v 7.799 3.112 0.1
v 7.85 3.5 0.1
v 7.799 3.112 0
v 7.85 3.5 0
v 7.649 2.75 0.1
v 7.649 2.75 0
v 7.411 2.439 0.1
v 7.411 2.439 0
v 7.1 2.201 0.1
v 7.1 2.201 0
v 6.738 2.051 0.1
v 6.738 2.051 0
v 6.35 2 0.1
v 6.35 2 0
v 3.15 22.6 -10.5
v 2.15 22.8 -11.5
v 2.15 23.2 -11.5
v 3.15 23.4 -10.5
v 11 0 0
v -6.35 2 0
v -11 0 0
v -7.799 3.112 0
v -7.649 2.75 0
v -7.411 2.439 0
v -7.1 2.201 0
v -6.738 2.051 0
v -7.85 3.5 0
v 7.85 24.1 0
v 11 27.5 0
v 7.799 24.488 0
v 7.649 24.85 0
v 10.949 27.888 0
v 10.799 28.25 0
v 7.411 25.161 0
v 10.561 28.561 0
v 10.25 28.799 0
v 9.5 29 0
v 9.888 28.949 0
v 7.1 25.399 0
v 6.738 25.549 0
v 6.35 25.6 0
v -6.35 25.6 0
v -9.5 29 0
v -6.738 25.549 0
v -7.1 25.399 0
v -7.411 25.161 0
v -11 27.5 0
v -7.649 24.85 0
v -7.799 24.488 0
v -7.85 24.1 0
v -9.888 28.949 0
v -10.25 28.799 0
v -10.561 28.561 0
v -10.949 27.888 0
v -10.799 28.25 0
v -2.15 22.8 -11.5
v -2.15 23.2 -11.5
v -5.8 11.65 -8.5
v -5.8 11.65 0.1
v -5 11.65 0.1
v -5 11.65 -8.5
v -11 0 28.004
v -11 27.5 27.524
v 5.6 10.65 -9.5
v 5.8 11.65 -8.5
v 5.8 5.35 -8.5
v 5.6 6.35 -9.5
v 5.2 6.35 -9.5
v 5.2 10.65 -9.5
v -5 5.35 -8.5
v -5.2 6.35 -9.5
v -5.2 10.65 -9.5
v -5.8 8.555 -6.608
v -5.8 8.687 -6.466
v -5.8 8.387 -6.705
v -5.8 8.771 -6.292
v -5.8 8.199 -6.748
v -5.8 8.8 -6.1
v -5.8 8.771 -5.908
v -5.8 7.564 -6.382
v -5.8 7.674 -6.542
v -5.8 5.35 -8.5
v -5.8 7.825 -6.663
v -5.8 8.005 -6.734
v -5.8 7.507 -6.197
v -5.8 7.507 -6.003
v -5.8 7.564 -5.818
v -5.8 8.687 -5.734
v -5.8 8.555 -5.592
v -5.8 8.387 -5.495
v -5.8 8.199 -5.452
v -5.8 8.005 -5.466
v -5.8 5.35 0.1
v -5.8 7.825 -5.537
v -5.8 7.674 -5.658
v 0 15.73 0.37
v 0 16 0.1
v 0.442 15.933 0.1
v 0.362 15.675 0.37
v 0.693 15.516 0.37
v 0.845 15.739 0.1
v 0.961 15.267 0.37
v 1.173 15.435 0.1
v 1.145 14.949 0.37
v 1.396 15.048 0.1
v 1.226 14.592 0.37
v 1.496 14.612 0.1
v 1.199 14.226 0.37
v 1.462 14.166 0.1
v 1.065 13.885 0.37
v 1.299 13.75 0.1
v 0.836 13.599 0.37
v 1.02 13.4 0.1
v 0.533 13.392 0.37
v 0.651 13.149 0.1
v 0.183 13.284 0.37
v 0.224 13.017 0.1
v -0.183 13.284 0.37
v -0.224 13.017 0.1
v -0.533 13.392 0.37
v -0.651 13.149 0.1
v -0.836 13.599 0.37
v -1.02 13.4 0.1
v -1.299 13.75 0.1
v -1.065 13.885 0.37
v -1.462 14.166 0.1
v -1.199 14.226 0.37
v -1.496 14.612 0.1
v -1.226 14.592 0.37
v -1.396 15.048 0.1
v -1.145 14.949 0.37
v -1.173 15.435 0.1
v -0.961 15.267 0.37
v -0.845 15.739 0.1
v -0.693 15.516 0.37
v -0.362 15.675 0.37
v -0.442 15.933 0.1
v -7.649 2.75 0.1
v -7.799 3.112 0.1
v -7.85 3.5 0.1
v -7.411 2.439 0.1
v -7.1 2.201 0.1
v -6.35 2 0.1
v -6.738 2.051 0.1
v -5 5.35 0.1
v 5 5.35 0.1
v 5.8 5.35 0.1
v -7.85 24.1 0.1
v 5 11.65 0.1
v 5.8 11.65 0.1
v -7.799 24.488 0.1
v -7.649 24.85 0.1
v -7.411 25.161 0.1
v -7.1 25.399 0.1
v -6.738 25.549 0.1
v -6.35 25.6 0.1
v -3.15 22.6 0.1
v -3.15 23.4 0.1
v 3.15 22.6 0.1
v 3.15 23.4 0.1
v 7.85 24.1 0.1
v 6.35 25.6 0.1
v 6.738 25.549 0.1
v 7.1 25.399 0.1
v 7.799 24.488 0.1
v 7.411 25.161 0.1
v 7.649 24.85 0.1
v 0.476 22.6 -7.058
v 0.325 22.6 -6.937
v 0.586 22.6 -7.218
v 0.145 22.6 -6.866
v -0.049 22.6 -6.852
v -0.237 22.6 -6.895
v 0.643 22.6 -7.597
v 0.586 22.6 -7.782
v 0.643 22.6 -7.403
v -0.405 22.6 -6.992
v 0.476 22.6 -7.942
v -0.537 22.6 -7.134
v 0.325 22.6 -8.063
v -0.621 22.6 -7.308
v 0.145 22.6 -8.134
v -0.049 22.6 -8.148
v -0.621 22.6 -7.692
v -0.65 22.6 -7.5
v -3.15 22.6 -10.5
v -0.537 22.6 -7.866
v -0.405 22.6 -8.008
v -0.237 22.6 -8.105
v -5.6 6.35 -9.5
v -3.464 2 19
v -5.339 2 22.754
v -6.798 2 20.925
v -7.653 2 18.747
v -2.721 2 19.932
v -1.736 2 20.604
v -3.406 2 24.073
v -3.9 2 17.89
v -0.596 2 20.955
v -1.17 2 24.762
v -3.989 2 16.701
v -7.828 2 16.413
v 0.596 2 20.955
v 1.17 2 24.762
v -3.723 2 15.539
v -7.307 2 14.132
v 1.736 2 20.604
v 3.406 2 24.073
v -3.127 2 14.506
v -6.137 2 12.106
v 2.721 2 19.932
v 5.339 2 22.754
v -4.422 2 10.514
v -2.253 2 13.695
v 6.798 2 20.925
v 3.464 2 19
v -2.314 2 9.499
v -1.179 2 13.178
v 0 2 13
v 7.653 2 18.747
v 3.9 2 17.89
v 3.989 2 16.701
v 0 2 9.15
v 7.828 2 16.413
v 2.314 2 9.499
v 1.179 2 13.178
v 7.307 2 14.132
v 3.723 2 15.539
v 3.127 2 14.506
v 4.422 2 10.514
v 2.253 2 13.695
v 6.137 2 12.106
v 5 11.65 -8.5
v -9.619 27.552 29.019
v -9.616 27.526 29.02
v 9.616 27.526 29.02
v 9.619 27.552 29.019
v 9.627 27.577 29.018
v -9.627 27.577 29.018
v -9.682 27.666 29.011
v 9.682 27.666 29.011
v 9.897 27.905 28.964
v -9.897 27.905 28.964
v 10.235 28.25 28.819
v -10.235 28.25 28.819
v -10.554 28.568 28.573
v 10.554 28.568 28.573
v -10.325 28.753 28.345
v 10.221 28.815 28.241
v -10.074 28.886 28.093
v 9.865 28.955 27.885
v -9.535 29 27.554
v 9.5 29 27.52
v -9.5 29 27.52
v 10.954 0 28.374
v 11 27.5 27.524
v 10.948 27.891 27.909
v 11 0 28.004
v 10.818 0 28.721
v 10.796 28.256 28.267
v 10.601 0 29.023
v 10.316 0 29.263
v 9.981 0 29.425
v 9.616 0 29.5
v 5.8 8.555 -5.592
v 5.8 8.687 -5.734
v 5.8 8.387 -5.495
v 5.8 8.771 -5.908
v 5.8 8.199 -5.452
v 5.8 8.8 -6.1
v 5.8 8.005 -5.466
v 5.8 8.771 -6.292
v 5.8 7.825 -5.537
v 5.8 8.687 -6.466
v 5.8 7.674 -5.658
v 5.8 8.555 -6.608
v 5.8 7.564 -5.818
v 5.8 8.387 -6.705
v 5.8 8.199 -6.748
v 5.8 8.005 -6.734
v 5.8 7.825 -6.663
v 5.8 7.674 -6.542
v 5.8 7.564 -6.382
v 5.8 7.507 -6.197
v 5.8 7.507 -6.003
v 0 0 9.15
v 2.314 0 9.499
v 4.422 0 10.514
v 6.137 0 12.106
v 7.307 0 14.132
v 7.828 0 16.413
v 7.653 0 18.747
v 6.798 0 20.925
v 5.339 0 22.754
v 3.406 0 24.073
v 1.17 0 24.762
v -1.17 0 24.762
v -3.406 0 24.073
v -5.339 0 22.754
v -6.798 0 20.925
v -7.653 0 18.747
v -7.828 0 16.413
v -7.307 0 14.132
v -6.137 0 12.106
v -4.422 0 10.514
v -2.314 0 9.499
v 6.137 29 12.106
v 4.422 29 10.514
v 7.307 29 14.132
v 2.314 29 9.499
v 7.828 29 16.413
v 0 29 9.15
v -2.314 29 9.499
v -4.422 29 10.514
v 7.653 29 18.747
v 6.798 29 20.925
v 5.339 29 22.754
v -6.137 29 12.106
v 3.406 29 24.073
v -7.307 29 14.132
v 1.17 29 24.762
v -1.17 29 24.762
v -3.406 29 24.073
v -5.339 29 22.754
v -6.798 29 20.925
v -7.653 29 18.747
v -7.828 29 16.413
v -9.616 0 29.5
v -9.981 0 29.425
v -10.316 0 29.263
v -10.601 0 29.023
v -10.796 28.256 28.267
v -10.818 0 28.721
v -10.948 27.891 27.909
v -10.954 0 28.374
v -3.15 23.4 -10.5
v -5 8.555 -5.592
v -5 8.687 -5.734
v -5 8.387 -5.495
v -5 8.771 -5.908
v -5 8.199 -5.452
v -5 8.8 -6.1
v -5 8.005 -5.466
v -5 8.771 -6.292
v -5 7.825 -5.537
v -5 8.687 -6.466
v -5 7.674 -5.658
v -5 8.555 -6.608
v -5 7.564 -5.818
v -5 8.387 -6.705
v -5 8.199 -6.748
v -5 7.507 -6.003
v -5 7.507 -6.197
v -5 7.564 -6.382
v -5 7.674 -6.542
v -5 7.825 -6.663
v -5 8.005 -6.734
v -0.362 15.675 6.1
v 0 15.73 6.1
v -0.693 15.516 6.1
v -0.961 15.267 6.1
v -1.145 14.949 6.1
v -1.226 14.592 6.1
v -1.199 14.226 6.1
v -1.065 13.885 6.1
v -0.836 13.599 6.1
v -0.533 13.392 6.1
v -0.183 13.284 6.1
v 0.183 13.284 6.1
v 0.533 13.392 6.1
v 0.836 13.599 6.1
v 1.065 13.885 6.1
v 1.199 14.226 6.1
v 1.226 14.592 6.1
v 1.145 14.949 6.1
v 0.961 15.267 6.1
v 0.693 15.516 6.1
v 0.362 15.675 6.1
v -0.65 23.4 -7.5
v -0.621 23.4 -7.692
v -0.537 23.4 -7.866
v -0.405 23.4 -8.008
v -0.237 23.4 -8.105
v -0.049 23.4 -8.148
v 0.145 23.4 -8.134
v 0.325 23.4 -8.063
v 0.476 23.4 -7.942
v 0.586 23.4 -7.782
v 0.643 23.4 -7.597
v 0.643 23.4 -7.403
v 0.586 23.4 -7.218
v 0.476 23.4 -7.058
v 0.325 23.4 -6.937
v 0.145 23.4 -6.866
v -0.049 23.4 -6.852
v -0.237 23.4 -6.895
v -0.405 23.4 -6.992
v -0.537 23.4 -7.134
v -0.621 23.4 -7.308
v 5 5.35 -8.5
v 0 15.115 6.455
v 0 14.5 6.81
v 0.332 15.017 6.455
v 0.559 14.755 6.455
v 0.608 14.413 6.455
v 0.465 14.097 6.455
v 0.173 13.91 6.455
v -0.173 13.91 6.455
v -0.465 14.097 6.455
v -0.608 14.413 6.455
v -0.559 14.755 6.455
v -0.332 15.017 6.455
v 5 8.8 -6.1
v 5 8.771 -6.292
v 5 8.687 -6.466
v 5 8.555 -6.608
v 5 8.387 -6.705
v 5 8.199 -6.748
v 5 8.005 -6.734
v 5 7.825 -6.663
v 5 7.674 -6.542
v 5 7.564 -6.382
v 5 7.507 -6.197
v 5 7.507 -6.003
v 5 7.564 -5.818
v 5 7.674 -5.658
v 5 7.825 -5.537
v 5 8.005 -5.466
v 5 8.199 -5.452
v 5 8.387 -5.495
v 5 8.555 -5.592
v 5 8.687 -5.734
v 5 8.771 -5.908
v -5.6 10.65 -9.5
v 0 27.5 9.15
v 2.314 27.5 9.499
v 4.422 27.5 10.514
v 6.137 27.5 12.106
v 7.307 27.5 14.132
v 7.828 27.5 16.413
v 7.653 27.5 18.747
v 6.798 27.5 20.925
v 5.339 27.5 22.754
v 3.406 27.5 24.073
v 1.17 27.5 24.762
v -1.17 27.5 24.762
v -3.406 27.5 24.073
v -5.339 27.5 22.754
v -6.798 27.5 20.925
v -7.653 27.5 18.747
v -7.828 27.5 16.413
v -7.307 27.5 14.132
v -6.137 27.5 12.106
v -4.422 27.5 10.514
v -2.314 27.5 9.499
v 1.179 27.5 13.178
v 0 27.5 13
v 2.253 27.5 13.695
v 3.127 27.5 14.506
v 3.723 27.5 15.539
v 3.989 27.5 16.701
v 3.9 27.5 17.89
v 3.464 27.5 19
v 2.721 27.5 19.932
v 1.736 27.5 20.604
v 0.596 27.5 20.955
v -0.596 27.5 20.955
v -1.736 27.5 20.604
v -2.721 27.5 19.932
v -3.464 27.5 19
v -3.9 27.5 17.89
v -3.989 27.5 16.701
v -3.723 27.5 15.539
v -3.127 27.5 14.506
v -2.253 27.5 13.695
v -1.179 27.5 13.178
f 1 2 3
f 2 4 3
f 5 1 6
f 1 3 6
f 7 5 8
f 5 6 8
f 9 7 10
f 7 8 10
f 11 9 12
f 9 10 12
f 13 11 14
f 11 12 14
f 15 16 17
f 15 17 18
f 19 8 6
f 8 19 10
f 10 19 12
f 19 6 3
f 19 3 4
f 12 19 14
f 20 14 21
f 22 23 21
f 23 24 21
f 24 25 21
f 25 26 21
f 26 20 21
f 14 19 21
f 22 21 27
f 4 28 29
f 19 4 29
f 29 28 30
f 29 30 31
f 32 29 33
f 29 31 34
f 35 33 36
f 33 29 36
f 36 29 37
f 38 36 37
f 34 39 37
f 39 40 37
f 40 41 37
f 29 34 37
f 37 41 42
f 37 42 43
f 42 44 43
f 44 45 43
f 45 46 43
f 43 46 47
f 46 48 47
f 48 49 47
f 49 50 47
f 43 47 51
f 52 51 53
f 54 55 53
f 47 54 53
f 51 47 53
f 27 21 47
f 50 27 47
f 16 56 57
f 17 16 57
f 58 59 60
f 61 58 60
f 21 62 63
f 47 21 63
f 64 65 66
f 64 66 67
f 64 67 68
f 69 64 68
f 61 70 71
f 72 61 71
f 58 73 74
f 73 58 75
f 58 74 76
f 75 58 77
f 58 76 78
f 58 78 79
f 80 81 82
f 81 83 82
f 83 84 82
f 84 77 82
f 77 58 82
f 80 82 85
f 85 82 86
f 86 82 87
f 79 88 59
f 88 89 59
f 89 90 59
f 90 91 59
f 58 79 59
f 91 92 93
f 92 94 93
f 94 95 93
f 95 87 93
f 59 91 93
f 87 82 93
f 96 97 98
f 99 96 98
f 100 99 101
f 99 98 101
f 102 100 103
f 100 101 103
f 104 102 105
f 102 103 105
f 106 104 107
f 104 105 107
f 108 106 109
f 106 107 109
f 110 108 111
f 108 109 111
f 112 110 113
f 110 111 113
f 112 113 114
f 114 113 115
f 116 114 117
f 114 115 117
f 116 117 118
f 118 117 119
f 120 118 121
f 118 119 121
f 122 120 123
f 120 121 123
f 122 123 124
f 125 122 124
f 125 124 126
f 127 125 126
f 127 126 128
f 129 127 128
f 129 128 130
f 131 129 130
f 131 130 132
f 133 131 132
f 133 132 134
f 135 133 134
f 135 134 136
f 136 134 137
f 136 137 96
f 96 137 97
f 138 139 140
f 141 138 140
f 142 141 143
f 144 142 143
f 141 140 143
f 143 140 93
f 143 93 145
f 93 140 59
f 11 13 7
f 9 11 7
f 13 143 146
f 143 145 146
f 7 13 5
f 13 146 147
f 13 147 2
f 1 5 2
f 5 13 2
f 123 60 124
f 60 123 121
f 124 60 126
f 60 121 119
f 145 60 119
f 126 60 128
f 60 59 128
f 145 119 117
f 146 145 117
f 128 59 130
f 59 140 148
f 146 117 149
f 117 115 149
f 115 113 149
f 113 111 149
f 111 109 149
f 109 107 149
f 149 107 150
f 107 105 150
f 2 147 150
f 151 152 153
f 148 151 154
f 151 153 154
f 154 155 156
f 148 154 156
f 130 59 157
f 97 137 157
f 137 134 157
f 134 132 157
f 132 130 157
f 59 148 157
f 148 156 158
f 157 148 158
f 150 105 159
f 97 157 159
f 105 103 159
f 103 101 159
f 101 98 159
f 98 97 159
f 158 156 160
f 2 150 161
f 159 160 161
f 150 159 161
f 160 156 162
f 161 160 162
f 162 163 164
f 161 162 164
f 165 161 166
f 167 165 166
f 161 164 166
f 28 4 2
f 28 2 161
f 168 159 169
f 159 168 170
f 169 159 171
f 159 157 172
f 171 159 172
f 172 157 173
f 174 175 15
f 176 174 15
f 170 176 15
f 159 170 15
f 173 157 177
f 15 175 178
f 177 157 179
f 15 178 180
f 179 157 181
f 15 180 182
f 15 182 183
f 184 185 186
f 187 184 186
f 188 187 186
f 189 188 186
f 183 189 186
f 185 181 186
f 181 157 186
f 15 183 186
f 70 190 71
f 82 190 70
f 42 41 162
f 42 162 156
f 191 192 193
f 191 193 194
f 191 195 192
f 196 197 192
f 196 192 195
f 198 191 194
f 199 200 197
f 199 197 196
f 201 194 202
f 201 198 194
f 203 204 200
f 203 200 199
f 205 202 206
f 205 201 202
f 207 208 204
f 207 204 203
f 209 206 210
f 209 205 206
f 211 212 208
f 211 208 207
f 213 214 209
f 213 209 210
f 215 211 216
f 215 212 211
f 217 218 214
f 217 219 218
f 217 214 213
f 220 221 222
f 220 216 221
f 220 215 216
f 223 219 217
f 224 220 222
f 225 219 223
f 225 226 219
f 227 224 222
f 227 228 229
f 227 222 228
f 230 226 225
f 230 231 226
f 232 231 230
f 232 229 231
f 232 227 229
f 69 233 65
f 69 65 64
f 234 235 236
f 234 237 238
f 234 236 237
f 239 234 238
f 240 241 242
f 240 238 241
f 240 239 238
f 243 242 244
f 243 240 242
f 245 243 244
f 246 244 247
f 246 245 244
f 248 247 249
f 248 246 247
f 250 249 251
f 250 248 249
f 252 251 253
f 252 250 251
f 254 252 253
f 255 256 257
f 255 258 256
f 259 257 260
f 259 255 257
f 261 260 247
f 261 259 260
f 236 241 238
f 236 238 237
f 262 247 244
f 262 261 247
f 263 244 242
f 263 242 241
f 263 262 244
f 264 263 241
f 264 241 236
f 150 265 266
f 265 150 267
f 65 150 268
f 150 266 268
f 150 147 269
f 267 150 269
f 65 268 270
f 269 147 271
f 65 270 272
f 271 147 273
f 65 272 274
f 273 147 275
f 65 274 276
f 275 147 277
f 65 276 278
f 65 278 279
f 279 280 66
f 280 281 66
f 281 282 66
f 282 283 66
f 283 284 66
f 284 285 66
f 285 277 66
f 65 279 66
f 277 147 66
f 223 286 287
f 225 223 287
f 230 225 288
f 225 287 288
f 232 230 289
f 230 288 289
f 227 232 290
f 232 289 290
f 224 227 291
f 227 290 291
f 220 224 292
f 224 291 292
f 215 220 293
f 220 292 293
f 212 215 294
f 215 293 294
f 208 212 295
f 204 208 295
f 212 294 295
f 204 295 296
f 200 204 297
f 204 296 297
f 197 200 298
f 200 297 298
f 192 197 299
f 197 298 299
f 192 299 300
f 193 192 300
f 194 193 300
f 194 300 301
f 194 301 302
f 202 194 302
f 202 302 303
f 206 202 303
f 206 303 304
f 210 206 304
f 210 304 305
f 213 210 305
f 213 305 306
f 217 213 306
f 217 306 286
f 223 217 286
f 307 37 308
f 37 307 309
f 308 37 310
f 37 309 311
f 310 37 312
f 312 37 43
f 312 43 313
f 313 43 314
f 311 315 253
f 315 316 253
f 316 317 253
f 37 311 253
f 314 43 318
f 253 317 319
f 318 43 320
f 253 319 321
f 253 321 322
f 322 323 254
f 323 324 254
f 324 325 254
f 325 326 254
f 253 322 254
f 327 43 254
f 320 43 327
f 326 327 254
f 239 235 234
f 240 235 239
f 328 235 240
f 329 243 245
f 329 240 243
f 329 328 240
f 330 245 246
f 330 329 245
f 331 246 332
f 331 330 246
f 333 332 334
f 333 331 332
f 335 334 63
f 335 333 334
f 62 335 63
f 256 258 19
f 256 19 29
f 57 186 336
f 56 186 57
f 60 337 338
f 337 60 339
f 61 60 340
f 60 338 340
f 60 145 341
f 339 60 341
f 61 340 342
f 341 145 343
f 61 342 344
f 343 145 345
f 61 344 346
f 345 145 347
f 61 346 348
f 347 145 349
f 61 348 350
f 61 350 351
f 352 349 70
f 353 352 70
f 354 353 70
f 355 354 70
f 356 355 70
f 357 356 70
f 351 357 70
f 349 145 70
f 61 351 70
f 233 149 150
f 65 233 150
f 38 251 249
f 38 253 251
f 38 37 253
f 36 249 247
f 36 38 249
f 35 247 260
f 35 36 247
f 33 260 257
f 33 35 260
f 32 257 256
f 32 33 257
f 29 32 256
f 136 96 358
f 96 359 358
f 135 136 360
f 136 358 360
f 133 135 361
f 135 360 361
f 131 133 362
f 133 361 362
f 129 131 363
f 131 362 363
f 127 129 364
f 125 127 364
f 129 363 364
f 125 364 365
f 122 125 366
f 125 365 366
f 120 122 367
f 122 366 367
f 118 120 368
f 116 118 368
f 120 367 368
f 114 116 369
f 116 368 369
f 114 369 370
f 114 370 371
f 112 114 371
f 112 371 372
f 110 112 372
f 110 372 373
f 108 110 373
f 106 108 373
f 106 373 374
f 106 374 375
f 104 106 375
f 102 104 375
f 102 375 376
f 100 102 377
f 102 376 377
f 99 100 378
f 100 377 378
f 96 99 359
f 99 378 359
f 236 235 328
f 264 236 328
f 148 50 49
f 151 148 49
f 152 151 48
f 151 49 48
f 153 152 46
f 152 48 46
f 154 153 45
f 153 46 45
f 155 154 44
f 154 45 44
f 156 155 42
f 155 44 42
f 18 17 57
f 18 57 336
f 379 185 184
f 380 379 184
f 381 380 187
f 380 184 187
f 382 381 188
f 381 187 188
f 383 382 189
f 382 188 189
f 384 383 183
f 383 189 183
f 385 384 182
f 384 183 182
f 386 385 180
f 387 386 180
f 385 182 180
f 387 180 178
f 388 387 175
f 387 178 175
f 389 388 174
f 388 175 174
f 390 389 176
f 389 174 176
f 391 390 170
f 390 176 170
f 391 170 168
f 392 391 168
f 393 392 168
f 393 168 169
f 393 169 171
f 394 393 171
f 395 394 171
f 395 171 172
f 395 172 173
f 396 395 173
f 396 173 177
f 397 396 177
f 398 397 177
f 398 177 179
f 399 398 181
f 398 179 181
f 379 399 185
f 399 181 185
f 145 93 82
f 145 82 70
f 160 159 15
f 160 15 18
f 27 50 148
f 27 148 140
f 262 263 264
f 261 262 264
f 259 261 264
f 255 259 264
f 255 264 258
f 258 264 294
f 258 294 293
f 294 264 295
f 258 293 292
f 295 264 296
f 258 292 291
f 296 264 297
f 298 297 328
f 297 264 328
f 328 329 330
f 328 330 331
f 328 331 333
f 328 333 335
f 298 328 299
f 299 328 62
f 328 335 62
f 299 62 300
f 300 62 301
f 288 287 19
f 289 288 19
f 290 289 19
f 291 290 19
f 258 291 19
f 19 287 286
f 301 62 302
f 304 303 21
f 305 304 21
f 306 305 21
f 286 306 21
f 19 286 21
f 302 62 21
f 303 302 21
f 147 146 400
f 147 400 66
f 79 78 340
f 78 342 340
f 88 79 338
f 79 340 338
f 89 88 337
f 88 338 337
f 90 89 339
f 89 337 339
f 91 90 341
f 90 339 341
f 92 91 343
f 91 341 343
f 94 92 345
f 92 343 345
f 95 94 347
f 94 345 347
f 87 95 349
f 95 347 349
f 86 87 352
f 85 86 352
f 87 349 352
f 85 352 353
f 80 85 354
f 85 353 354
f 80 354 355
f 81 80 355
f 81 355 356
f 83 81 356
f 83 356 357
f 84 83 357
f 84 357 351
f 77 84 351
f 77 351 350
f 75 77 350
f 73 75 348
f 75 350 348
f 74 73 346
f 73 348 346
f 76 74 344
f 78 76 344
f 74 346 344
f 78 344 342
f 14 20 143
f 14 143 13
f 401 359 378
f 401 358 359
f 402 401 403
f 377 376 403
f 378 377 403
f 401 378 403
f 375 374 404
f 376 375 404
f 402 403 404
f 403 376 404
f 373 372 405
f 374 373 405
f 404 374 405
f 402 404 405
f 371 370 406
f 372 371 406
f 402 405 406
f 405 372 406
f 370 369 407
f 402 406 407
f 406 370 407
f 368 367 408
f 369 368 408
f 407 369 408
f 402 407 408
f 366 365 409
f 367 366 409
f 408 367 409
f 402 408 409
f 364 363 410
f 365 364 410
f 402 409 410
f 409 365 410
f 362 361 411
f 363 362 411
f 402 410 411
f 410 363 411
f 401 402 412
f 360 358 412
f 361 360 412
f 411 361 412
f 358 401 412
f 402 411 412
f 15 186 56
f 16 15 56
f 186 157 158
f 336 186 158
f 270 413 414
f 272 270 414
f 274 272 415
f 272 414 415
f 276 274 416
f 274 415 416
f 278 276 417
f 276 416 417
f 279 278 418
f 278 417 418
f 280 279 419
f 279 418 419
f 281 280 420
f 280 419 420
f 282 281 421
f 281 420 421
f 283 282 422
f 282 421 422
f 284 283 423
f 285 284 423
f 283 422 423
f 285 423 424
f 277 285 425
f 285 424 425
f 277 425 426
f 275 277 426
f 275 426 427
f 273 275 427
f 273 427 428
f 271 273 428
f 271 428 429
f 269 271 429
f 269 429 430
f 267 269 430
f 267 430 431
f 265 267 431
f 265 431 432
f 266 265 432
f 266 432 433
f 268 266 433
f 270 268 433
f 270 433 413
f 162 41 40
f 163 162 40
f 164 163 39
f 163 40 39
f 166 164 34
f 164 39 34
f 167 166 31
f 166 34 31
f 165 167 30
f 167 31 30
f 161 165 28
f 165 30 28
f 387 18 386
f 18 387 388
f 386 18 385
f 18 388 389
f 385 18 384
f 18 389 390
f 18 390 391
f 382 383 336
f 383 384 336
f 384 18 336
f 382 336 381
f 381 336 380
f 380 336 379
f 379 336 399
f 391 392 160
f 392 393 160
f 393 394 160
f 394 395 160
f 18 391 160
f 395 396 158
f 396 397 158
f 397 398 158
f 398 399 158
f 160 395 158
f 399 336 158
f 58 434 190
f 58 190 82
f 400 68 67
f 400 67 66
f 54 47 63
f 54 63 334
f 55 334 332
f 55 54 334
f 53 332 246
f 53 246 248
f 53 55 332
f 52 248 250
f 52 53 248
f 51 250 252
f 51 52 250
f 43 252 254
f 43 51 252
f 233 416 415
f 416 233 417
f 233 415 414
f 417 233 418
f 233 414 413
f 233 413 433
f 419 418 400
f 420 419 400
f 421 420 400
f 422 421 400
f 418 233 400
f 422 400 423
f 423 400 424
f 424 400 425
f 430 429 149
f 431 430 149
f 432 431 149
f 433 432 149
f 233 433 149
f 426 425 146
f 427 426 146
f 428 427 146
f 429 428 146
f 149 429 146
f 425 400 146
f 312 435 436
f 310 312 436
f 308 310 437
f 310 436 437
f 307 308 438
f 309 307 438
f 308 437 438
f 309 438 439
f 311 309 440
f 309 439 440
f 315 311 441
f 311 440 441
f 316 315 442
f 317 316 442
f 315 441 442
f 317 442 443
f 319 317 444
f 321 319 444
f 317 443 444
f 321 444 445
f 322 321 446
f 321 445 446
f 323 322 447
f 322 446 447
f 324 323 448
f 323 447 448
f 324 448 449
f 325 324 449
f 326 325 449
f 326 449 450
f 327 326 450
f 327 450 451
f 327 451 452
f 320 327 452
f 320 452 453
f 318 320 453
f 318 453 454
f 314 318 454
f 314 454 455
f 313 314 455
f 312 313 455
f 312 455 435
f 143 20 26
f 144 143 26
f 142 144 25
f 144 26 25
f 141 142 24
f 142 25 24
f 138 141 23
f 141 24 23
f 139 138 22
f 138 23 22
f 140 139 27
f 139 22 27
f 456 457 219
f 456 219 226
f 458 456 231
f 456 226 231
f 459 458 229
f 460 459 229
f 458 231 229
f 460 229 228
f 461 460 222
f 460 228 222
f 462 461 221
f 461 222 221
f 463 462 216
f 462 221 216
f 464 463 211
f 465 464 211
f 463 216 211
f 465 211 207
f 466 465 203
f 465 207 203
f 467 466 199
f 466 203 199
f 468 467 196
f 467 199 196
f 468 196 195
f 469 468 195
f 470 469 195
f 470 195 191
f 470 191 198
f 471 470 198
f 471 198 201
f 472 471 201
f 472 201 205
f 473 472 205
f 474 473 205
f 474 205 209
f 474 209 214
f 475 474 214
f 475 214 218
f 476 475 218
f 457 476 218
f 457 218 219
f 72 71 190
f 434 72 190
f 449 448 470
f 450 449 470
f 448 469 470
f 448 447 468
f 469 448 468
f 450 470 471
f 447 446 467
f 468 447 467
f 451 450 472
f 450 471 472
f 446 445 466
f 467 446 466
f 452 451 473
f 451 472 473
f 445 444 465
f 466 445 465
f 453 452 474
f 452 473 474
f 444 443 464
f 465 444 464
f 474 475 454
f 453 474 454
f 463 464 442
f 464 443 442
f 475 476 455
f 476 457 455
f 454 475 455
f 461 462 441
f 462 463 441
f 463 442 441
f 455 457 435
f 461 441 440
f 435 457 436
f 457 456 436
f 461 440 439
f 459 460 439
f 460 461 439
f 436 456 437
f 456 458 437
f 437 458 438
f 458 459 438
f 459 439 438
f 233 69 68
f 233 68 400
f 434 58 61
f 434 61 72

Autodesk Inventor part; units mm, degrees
sketch "Sketch_2" plane through (0, 0, 0) normal (1, 0, 0) x (0, 1, 0)
  line L0 (0, 29.5) -> (0, 0)
  line L1 (0, 0) -> (29, 0)
  line L2 (29, 0) -> (29, 27.5198)
  arc A0 (29, 27.5198) -> (27.5262, 29.0195) centre (27.5, 27.5198) ccw
  line L3 (27.5262, 29.0195) -> (0, 29.5)
extrude "Extrusion1" add sketch "Sketch_2" along normal mid plane 22
sketch "Sketch_3" plane through (0, 0, 0) normal (0, 0.9998, -0.0175) x (1, 0, 0)
  line L0 (-11, -28) -> (-11, -38)
  line L1 (-11, -38) -> (11, -38)
  line L2 (11, -38) -> (11, -28)
  arc A0 (9.5, -29.5) -> (11, -28) centre (9.5, -28) ccw
  line L3 (9.5, -29.5) -> (-9.5, -29.5)
  arc A1 (-11, -28) -> (-9.5, -29.5) centre (-9.5, -28) ccw
extrude "Extrusion2" cut sketch "Sketch_3" along normal mid plane 60
sketch "Sketch_4" plane through (0, 0, 0) normal (0, 0, 1) x (1, 0, 0)
  arc A0 (-9.5, 29) -> (-11, 27.5) centre (-9.5, 27.5) ccw
  line L0 (-9.5, 29) -> (9.5, 29)
  arc A1 (11, 27.5) -> (9.5, 29) centre (9.5, 27.5) ccw
  line L1 (11, 27.5) -> (11, 37.5)
  line L2 (11, 37.5) -> (-11, 37.5)
  line L3 (-11, 37.5) -> (-11, 27.5)
extrude "Extrusion3" cut sketch "Sketch_4" along normal blind 29.5
sketch "Sketch_5" plane through (0, 0, 0) normal (1, 0, 0) x (0, 1, 0)
  line L0 (0, 17) -> (29, 17)
  line L1 (29, 17) -> (29, 9.15)
  line L2 (29, 9.15) -> (27.5, 9.15)
  line L3 (27.5, 9.15) -> (27.5, 13)
  line L4 (27.5, 13) -> (2, 13)
  line L5 (2, 13) -> (2, 9.15)
  line L6 (2, 9.15) -> (0, 9.15)
  line L7 (0, 9.15) -> (0, 17)
  line L8 (0, 17) -> (29, 17)
revolve "Revolution1" cut sketch "Sketch_5" angle 360 about axis through (0, 0, 17) along (0, -1, 0)
sketch "Sketch_16" plane through (0, 0, 0) normal (0, 0, 1) x (1, 0, 0)
  arc A0 (-7.85, 3.5) -> (-6.35, 2) centre (-6.35, 3.5) ccw
  line L0 (-6.35, 2) -> (6.35, 2)
  arc A1 (6.35, 2) -> (7.85, 3.5) centre (6.35, 3.5) ccw
  line L1 (7.85, 3.5) -> (7.85, 24.1)
  arc A2 (7.85, 24.1) -> (6.35, 25.6) centre (6.35, 24.1) ccw
  line L2 (6.35, 25.6) -> (-6.35, 25.6)
  arc A3 (-6.35, 25.6) -> (-7.85, 24.1) centre (-6.35, 24.1) ccw
  line L3 (-7.85, 24.1) -> (-7.85, 3.5)
extrude "Extrusion4" cut sketch "Sketch_16" along normal blind 0.1
sketch "Sketch6" plane through (0, 0, 0.1) normal (0, 0, -1) x (-1, 0, 0)
  point P0 (0, 14.5)
hole "Hole1" at (0, 14.5, 0.1) direction (0, 0, 1) diameter 2.459 depth 6 tip angle 120 countersink diameter 3 countersink angle 90 thread size "M3x0.5" class "6H" standard "ISO Metric profile"
sketch "Sketch_18" plane through (0, 0, 0) normal (1, 0, 0) x (0, 1, 0)
  line L0 (23.4, 0.1) -> (22.6, 0.1)
  line L1 (22.6, 0.1) -> (22.6, -10.5)
  line L2 (22.6, -10.5) -> (22.8, -11.5)
  line L3 (22.8, -11.5) -> (23.2, -11.5)
  line L4 (23.2, -11.5) -> (23.4, -10.5)
  line L5 (23.4, -10.5) -> (23.4, 0.1)
extrude "Extrusion5" add sketch "Sketch_18" along normal mid plane 6.3
sketch "Sketch_7" plane through (0, 8.5, 0) normal (0, 1, 0) x (1, 0, 0)
  line L0 (5, 8.5) -> (5, -0.1)
  line L1 (5, -0.1) -> (5.8, -0.1)
  line L2 (5.8, -0.1) -> (5.8, 8.5)
  line L3 (5.8, 8.5) -> (5.6, 9.5)
  line L4 (5.6, 9.5) -> (5.2, 9.5)
  line L5 (5.2, 9.5) -> (5, 8.5)
extrude "Extrusion6" add sketch "Sketch_7" along normal mid plane 6.3
sketch "Sketch_8" plane through (0, 8.5, 0) normal (0, 1, 0) x (1, 0, 0)
  line L0 (-5.8, 8.5) -> (-5.8, -0.1)
  line L1 (-5.8, -0.1) -> (-5, -0.1)
  line L2 (-5, -0.1) -> (-5, 8.5)
  line L3 (-5, 8.5) -> (-5.2, 9.5)
  line L4 (-5.2, 9.5) -> (-5.6, 9.5)
  line L5 (-5.6, 9.5) -> (-5.8, 8.5)
extrude "Extrusion7" add sketch "Sketch_8" along normal mid plane 6.3
sketch "Sketch_10" plane through (0, 0, 0) normal (0, 1, 0) x (-1, 0, 0)
  circle A0 centre (0, -7.5) radius 0.65
extrude "Extrusion8" cut sketch "Sketch_10" along normal blind 29
sketch "Sketch_11" plane through (0, 0, 0) normal (1, 0, 0) x (0, 1, 0)
  circle A0 centre (8.15, -6.1) radius 0.65
extrude "Extrusion9" cut sketch "Sketch_11" along normal mid plane 22
sketch "Sketch_12" plane through (0, 0, 0) normal (0, 1, 0) x (-1, 0, 0)
  line L0 (3.15, -10.5) -> (1.7358, -11.9142)
  line L1 (1.7358, -11.9142) -> (-1.7358, -11.9142)
  line L2 (-1.7358, -11.9142) -> (-3.15, -10.5)
  line L3 (-3.15, -10.5) -> (-3.15, -12.5)
  line L4 (-3.15, -12.5) -> (3.15, -12.5)
  line L5 (3.15, -12.5) -> (3.15, -10.5)
extrude "Extrusion10" cut sketch "Sketch_12" along normal blind 29
sketch "Sketch_13" plane through (0, 0, 0) normal (1, 0, 0) x (0, 1, 0)
  line L0 (11.65, -8.5) -> (10.2358, -9.9142)
  line L1 (10.2358, -9.9142) -> (6.7642, -9.9142)
  line L2 (6.7642, -9.9142) -> (5.35, -8.5)
  line L3 (5.35, -8.5) -> (5.35, -10.5)
  line L4 (5.35, -10.5) -> (11.65, -10.5)
  line L5 (11.65, -10.5) -> (11.65, -8.5)
extrude "Extrusion11" cut sketch "Sketch_13" along normal mid plane 22
ref_plane "2DUMMY_XY" through (0, 14.5, 0) normal (0, 0, -1) x (1, 0, 0)
ref_plane "2DUMMY_YZ" through (0, 14.5, 0) normal (1, 0, 0) x (0, -1, 0)
ref_plane "2DUMMY_ZX" through (0, 14.5, 0) normal (0, -1, 0) x (0, 0, -1)
ref_plane "ANBAU_Stecker_XY" through (0, 14.5, 0) normal (0, 0, 1) x (1, 0, 0)
ref_plane "ANBAU_Stecker_YZ" through (0, 14.5, 0) normal (1, 0, 0) x (0, 1, 0)
ref_plane "ANBAU_Stecker_ZX" through (0, 14.5, 0) normal (0, 1, 0) x (0, 0, 1)
ref_plane "IP1_XY" through (0, 27.5, 17) normal (0, -1, 0) x (1, 0, 0)
ref_plane "IP1_YZ" through (0, 27.5, 17) normal (1, 0, 0) x (0, 0, 1)
ref_plane "IP1_ZX" through (0, 27.5, 17) normal (0, 0, 1) x (0, -1, 0)
properties part number "389924 MSFG-24-42-50/60---(P)"
